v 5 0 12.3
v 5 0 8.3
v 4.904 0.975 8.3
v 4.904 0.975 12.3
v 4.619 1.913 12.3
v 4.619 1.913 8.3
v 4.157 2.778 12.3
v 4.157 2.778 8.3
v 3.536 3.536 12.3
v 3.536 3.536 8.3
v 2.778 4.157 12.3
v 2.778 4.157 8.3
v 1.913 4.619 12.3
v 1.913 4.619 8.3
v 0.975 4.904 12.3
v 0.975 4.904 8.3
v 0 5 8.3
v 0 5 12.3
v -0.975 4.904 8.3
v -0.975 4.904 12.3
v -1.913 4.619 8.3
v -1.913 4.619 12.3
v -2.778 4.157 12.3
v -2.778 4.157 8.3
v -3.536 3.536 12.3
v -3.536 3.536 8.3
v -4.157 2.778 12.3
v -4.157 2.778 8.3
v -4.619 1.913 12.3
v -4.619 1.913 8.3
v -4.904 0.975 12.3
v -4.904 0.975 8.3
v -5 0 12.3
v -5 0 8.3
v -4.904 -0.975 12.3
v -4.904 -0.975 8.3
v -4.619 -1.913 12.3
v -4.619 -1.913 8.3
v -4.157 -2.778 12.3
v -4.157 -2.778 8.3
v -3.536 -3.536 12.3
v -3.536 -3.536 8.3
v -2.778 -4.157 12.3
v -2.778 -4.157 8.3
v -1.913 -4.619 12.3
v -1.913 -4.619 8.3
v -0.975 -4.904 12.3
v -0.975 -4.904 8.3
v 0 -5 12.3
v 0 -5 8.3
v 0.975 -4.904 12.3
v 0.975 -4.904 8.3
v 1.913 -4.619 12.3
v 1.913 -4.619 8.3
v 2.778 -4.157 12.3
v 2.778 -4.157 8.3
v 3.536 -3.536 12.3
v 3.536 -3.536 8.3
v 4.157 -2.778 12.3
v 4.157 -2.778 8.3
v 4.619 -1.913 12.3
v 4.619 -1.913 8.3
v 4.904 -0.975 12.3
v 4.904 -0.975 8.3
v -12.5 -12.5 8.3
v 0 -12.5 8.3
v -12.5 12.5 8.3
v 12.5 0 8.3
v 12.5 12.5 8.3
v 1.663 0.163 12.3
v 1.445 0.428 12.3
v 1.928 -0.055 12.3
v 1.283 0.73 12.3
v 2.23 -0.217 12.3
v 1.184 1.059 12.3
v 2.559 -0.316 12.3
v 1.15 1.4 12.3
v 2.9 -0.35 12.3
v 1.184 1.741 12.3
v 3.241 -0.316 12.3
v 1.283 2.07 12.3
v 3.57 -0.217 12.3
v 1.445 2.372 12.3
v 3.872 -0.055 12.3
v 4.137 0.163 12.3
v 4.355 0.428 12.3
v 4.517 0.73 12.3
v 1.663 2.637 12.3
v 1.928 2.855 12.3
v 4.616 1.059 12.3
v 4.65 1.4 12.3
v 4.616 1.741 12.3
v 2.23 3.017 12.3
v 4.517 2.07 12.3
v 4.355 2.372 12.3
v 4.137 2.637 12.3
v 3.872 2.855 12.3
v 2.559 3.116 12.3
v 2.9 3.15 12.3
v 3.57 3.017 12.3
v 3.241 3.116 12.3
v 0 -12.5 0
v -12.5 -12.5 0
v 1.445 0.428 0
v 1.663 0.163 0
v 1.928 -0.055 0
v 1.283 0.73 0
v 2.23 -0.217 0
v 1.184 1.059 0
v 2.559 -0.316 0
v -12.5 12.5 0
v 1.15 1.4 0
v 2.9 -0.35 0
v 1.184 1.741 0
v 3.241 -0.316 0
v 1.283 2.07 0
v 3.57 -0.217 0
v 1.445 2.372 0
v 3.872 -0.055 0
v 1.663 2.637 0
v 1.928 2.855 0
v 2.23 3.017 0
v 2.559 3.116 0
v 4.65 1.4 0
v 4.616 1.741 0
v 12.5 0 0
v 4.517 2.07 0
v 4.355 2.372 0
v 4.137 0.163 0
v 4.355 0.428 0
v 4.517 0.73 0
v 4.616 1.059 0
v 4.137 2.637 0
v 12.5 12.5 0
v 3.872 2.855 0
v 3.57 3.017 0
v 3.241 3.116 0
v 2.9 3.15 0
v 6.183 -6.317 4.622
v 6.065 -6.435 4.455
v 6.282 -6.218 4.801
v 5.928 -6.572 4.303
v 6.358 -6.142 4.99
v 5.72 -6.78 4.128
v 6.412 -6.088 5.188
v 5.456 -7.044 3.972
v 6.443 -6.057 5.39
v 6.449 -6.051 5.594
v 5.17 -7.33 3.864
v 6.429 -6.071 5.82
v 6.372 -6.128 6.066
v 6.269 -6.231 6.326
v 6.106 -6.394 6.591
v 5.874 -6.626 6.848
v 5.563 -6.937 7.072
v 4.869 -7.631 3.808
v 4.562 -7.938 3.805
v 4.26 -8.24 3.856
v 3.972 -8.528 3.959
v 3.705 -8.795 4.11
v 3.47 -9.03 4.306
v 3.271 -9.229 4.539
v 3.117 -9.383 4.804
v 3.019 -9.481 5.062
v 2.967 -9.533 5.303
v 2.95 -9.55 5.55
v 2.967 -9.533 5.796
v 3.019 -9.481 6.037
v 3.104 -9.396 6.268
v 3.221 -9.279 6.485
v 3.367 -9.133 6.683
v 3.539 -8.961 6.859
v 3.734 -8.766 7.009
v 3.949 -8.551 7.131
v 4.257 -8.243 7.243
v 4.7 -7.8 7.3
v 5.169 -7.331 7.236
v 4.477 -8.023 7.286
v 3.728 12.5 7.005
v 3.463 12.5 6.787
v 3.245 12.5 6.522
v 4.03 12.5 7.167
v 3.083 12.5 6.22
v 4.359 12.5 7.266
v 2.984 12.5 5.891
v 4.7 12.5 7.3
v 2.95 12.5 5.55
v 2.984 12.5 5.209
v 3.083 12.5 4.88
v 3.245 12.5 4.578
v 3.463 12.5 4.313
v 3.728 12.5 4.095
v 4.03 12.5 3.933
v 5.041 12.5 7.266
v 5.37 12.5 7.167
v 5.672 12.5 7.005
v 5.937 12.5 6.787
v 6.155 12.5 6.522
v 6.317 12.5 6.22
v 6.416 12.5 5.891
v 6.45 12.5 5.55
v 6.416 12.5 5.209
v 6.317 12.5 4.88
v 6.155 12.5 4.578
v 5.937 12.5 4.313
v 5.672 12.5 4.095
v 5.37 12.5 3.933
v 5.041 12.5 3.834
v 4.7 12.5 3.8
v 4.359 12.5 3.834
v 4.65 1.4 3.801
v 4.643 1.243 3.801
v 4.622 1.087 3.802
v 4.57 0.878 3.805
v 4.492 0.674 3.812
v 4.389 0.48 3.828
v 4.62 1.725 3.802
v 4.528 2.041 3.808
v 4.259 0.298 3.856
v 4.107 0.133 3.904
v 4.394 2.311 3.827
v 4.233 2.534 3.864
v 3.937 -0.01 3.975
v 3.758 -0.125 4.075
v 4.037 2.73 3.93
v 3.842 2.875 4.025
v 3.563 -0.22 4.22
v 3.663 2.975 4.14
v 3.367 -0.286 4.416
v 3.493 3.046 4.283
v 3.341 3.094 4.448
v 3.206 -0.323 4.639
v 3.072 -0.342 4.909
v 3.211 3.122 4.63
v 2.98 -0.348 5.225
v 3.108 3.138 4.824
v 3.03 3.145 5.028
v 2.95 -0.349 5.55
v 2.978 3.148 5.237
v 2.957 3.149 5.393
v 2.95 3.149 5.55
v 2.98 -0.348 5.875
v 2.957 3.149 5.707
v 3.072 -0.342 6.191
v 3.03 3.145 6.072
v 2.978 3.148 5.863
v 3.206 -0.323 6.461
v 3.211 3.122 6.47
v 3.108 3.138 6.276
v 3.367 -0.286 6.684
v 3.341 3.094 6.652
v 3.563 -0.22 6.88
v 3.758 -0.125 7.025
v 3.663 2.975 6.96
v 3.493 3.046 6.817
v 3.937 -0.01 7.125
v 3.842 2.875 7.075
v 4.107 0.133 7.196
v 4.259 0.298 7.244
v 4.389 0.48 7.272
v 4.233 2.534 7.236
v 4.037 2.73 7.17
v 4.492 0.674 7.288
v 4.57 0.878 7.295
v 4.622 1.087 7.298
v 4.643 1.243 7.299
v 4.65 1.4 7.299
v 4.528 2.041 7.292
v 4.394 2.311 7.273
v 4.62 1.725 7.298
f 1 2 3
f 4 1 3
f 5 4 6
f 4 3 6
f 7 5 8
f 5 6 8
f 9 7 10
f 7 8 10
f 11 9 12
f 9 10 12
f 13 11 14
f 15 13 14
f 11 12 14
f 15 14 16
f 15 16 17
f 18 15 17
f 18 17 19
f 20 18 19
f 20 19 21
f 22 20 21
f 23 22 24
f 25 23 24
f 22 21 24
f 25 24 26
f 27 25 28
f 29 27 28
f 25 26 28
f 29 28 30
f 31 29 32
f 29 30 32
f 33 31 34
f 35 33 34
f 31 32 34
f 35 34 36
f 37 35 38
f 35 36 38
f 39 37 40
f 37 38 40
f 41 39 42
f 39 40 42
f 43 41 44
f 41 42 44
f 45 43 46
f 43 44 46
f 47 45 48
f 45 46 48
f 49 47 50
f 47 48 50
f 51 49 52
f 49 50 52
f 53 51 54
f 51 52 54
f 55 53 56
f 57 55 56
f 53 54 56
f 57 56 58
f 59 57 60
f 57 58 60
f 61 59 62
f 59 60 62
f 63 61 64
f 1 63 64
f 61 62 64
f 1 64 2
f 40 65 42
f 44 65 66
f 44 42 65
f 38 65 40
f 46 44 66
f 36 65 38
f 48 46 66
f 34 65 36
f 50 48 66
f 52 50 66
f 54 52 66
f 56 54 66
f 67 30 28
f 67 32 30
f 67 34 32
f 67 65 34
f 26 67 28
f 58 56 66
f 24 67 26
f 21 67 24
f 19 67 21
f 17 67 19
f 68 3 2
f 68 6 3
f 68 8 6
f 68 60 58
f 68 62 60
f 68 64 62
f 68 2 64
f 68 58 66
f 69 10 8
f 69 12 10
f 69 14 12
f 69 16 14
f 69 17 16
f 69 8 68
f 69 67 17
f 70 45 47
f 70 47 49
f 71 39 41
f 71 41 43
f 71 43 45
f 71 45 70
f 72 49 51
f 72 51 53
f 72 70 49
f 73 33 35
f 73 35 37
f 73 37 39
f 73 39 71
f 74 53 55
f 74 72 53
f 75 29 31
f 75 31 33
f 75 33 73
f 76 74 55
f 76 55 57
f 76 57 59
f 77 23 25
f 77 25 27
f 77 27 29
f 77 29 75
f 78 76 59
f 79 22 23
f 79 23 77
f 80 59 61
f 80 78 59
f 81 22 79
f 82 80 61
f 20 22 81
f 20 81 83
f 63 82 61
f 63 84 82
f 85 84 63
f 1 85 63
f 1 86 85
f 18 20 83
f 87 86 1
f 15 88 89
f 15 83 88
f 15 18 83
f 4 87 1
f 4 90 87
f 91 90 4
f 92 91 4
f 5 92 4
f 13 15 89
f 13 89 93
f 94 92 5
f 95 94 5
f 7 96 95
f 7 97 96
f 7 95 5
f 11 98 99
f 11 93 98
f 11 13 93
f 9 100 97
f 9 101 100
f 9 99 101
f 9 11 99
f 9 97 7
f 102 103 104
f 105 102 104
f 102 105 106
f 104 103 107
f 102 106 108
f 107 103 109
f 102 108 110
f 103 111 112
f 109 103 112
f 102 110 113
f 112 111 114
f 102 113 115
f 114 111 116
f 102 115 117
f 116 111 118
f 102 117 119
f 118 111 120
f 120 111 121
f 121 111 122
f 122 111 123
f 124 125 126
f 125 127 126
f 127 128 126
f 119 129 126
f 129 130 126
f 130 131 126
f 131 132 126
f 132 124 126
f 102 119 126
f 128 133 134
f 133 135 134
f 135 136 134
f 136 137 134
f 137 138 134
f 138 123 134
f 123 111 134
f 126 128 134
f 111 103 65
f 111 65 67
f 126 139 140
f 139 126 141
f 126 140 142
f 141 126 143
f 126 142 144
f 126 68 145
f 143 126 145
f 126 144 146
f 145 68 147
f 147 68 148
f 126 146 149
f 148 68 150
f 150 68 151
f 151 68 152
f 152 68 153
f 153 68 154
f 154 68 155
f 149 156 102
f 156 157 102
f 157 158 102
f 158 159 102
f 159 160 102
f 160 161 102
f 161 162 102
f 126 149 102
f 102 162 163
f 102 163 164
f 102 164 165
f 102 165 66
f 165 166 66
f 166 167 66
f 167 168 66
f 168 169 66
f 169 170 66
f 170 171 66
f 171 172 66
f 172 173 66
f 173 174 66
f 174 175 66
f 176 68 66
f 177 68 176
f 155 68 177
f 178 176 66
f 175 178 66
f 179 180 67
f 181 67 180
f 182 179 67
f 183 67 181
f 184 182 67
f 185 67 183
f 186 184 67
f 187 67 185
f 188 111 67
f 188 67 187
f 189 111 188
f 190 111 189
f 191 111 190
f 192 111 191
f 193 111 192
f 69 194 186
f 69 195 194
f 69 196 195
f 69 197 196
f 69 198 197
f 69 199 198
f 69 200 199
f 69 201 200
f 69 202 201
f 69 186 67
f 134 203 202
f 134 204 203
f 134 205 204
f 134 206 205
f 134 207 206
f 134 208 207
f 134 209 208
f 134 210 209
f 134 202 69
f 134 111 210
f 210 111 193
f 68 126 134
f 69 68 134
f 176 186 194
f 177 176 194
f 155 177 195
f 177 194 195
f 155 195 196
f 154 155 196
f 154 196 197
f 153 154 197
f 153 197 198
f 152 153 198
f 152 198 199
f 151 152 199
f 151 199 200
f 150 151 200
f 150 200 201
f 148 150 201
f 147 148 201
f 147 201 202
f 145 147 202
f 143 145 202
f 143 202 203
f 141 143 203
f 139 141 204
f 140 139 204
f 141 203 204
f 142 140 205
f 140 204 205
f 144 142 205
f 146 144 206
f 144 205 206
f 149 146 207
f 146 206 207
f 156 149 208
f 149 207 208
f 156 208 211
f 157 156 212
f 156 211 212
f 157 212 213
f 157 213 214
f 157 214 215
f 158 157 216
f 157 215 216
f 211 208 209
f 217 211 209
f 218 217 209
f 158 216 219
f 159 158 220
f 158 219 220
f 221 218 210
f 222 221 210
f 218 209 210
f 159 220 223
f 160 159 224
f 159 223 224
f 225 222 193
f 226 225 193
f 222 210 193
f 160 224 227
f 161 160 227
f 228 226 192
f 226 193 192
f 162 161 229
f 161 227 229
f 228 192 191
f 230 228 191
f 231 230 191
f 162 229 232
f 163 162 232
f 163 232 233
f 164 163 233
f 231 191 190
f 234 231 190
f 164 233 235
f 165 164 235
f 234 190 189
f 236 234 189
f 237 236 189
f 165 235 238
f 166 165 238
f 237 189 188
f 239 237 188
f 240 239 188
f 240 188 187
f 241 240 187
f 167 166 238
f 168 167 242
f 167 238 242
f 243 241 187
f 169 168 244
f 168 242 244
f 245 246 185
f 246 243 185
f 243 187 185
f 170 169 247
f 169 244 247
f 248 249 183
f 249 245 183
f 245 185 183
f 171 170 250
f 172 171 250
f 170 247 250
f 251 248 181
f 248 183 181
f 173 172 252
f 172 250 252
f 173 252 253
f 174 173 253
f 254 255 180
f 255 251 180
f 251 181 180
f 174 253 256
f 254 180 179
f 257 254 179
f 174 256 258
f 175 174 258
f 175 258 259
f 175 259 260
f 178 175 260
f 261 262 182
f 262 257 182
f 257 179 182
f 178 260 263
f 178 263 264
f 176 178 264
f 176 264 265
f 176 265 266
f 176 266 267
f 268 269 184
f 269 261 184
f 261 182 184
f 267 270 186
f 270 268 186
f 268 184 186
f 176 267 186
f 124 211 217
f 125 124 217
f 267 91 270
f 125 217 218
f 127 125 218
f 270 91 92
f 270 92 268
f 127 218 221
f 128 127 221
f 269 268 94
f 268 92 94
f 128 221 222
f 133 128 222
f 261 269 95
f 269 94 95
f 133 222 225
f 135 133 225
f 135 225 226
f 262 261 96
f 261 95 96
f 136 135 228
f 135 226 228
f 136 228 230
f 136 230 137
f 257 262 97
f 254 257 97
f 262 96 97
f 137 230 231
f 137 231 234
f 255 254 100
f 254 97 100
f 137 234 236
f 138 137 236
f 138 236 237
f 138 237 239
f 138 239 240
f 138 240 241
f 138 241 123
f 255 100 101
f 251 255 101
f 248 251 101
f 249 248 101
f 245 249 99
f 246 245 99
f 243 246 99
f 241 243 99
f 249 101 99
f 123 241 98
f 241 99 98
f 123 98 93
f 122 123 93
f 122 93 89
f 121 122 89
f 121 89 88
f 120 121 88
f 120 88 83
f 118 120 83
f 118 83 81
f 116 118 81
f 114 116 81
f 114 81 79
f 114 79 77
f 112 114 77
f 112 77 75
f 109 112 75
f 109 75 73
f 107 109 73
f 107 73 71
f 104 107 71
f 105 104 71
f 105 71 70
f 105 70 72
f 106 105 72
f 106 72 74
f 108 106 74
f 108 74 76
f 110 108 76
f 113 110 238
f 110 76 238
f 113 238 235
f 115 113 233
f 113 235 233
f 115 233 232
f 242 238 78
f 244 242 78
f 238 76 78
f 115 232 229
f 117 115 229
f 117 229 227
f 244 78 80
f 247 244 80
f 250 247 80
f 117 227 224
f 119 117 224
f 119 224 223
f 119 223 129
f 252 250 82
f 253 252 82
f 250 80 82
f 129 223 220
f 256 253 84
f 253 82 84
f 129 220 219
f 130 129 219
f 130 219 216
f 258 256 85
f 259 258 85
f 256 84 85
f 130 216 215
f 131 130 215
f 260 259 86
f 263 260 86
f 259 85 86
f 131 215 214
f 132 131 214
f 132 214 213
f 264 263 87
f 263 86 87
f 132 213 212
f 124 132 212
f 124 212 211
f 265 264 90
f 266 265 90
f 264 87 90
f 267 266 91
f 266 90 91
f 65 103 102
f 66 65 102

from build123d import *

# Parameters (mm, degrees)
F0_W     = 25
F0_H     = 25
F1_DEPTH = 8.3
F2_R     = 5
F3_DEPTH = 4
F5_DEPTH = 25
F6_R     = 1.75
F7_DEPTH = 25
F9_DEPTH = 25


with BuildPart() as f1:
    # F0 (on Top) → F1 (new body)
    with BuildSketch(Plane.XY):
        Rectangle(F0_W, F0_H)
    extrude(amount=F1_DEPTH)

    # F2 (on face) → F3 (join)
    with BuildSketch(Plane.XY.offset(8.3)):
        Circle(F2_R)
    extrude(amount=F3_DEPTH)

    # F4 (on face) → F5 (cut)
    with BuildSketch(Plane.XY.offset(8.3)):
        Polygon((12.5, -12.5), (12.5, 0), (0, -12.5), align=None)
    extrude(amount=-F5_DEPTH, mode=Mode.SUBTRACT)

    # F6 (on face) → F7 (cut)
    with BuildSketch(Plane.XY.offset(12.3)):
        with Locations((2.900001, 1.400001)):
            Circle(F6_R)
    extrude(amount=-F7_DEPTH, mode=Mode.SUBTRACT)

    # F8 (on face) → F9 (cut)
    with BuildSketch(Plane(origin=(0, 12.5, 0), x_dir=(-1, 0, 0), z_dir=(0, 1, 0))):
        with BuildLine():
            ThreePointArc((-4.7, 7.3), (-5.937437, 4.312563), (-2.95, 5.55))
            ThreePointArc((-2.95, 5.55), (-3.462563, 6.787437), (-4.7, 7.3))
        make_face()
    extrude(amount=-F9_DEPTH, mode=Mode.SUBTRACT)


solid = f1.part
